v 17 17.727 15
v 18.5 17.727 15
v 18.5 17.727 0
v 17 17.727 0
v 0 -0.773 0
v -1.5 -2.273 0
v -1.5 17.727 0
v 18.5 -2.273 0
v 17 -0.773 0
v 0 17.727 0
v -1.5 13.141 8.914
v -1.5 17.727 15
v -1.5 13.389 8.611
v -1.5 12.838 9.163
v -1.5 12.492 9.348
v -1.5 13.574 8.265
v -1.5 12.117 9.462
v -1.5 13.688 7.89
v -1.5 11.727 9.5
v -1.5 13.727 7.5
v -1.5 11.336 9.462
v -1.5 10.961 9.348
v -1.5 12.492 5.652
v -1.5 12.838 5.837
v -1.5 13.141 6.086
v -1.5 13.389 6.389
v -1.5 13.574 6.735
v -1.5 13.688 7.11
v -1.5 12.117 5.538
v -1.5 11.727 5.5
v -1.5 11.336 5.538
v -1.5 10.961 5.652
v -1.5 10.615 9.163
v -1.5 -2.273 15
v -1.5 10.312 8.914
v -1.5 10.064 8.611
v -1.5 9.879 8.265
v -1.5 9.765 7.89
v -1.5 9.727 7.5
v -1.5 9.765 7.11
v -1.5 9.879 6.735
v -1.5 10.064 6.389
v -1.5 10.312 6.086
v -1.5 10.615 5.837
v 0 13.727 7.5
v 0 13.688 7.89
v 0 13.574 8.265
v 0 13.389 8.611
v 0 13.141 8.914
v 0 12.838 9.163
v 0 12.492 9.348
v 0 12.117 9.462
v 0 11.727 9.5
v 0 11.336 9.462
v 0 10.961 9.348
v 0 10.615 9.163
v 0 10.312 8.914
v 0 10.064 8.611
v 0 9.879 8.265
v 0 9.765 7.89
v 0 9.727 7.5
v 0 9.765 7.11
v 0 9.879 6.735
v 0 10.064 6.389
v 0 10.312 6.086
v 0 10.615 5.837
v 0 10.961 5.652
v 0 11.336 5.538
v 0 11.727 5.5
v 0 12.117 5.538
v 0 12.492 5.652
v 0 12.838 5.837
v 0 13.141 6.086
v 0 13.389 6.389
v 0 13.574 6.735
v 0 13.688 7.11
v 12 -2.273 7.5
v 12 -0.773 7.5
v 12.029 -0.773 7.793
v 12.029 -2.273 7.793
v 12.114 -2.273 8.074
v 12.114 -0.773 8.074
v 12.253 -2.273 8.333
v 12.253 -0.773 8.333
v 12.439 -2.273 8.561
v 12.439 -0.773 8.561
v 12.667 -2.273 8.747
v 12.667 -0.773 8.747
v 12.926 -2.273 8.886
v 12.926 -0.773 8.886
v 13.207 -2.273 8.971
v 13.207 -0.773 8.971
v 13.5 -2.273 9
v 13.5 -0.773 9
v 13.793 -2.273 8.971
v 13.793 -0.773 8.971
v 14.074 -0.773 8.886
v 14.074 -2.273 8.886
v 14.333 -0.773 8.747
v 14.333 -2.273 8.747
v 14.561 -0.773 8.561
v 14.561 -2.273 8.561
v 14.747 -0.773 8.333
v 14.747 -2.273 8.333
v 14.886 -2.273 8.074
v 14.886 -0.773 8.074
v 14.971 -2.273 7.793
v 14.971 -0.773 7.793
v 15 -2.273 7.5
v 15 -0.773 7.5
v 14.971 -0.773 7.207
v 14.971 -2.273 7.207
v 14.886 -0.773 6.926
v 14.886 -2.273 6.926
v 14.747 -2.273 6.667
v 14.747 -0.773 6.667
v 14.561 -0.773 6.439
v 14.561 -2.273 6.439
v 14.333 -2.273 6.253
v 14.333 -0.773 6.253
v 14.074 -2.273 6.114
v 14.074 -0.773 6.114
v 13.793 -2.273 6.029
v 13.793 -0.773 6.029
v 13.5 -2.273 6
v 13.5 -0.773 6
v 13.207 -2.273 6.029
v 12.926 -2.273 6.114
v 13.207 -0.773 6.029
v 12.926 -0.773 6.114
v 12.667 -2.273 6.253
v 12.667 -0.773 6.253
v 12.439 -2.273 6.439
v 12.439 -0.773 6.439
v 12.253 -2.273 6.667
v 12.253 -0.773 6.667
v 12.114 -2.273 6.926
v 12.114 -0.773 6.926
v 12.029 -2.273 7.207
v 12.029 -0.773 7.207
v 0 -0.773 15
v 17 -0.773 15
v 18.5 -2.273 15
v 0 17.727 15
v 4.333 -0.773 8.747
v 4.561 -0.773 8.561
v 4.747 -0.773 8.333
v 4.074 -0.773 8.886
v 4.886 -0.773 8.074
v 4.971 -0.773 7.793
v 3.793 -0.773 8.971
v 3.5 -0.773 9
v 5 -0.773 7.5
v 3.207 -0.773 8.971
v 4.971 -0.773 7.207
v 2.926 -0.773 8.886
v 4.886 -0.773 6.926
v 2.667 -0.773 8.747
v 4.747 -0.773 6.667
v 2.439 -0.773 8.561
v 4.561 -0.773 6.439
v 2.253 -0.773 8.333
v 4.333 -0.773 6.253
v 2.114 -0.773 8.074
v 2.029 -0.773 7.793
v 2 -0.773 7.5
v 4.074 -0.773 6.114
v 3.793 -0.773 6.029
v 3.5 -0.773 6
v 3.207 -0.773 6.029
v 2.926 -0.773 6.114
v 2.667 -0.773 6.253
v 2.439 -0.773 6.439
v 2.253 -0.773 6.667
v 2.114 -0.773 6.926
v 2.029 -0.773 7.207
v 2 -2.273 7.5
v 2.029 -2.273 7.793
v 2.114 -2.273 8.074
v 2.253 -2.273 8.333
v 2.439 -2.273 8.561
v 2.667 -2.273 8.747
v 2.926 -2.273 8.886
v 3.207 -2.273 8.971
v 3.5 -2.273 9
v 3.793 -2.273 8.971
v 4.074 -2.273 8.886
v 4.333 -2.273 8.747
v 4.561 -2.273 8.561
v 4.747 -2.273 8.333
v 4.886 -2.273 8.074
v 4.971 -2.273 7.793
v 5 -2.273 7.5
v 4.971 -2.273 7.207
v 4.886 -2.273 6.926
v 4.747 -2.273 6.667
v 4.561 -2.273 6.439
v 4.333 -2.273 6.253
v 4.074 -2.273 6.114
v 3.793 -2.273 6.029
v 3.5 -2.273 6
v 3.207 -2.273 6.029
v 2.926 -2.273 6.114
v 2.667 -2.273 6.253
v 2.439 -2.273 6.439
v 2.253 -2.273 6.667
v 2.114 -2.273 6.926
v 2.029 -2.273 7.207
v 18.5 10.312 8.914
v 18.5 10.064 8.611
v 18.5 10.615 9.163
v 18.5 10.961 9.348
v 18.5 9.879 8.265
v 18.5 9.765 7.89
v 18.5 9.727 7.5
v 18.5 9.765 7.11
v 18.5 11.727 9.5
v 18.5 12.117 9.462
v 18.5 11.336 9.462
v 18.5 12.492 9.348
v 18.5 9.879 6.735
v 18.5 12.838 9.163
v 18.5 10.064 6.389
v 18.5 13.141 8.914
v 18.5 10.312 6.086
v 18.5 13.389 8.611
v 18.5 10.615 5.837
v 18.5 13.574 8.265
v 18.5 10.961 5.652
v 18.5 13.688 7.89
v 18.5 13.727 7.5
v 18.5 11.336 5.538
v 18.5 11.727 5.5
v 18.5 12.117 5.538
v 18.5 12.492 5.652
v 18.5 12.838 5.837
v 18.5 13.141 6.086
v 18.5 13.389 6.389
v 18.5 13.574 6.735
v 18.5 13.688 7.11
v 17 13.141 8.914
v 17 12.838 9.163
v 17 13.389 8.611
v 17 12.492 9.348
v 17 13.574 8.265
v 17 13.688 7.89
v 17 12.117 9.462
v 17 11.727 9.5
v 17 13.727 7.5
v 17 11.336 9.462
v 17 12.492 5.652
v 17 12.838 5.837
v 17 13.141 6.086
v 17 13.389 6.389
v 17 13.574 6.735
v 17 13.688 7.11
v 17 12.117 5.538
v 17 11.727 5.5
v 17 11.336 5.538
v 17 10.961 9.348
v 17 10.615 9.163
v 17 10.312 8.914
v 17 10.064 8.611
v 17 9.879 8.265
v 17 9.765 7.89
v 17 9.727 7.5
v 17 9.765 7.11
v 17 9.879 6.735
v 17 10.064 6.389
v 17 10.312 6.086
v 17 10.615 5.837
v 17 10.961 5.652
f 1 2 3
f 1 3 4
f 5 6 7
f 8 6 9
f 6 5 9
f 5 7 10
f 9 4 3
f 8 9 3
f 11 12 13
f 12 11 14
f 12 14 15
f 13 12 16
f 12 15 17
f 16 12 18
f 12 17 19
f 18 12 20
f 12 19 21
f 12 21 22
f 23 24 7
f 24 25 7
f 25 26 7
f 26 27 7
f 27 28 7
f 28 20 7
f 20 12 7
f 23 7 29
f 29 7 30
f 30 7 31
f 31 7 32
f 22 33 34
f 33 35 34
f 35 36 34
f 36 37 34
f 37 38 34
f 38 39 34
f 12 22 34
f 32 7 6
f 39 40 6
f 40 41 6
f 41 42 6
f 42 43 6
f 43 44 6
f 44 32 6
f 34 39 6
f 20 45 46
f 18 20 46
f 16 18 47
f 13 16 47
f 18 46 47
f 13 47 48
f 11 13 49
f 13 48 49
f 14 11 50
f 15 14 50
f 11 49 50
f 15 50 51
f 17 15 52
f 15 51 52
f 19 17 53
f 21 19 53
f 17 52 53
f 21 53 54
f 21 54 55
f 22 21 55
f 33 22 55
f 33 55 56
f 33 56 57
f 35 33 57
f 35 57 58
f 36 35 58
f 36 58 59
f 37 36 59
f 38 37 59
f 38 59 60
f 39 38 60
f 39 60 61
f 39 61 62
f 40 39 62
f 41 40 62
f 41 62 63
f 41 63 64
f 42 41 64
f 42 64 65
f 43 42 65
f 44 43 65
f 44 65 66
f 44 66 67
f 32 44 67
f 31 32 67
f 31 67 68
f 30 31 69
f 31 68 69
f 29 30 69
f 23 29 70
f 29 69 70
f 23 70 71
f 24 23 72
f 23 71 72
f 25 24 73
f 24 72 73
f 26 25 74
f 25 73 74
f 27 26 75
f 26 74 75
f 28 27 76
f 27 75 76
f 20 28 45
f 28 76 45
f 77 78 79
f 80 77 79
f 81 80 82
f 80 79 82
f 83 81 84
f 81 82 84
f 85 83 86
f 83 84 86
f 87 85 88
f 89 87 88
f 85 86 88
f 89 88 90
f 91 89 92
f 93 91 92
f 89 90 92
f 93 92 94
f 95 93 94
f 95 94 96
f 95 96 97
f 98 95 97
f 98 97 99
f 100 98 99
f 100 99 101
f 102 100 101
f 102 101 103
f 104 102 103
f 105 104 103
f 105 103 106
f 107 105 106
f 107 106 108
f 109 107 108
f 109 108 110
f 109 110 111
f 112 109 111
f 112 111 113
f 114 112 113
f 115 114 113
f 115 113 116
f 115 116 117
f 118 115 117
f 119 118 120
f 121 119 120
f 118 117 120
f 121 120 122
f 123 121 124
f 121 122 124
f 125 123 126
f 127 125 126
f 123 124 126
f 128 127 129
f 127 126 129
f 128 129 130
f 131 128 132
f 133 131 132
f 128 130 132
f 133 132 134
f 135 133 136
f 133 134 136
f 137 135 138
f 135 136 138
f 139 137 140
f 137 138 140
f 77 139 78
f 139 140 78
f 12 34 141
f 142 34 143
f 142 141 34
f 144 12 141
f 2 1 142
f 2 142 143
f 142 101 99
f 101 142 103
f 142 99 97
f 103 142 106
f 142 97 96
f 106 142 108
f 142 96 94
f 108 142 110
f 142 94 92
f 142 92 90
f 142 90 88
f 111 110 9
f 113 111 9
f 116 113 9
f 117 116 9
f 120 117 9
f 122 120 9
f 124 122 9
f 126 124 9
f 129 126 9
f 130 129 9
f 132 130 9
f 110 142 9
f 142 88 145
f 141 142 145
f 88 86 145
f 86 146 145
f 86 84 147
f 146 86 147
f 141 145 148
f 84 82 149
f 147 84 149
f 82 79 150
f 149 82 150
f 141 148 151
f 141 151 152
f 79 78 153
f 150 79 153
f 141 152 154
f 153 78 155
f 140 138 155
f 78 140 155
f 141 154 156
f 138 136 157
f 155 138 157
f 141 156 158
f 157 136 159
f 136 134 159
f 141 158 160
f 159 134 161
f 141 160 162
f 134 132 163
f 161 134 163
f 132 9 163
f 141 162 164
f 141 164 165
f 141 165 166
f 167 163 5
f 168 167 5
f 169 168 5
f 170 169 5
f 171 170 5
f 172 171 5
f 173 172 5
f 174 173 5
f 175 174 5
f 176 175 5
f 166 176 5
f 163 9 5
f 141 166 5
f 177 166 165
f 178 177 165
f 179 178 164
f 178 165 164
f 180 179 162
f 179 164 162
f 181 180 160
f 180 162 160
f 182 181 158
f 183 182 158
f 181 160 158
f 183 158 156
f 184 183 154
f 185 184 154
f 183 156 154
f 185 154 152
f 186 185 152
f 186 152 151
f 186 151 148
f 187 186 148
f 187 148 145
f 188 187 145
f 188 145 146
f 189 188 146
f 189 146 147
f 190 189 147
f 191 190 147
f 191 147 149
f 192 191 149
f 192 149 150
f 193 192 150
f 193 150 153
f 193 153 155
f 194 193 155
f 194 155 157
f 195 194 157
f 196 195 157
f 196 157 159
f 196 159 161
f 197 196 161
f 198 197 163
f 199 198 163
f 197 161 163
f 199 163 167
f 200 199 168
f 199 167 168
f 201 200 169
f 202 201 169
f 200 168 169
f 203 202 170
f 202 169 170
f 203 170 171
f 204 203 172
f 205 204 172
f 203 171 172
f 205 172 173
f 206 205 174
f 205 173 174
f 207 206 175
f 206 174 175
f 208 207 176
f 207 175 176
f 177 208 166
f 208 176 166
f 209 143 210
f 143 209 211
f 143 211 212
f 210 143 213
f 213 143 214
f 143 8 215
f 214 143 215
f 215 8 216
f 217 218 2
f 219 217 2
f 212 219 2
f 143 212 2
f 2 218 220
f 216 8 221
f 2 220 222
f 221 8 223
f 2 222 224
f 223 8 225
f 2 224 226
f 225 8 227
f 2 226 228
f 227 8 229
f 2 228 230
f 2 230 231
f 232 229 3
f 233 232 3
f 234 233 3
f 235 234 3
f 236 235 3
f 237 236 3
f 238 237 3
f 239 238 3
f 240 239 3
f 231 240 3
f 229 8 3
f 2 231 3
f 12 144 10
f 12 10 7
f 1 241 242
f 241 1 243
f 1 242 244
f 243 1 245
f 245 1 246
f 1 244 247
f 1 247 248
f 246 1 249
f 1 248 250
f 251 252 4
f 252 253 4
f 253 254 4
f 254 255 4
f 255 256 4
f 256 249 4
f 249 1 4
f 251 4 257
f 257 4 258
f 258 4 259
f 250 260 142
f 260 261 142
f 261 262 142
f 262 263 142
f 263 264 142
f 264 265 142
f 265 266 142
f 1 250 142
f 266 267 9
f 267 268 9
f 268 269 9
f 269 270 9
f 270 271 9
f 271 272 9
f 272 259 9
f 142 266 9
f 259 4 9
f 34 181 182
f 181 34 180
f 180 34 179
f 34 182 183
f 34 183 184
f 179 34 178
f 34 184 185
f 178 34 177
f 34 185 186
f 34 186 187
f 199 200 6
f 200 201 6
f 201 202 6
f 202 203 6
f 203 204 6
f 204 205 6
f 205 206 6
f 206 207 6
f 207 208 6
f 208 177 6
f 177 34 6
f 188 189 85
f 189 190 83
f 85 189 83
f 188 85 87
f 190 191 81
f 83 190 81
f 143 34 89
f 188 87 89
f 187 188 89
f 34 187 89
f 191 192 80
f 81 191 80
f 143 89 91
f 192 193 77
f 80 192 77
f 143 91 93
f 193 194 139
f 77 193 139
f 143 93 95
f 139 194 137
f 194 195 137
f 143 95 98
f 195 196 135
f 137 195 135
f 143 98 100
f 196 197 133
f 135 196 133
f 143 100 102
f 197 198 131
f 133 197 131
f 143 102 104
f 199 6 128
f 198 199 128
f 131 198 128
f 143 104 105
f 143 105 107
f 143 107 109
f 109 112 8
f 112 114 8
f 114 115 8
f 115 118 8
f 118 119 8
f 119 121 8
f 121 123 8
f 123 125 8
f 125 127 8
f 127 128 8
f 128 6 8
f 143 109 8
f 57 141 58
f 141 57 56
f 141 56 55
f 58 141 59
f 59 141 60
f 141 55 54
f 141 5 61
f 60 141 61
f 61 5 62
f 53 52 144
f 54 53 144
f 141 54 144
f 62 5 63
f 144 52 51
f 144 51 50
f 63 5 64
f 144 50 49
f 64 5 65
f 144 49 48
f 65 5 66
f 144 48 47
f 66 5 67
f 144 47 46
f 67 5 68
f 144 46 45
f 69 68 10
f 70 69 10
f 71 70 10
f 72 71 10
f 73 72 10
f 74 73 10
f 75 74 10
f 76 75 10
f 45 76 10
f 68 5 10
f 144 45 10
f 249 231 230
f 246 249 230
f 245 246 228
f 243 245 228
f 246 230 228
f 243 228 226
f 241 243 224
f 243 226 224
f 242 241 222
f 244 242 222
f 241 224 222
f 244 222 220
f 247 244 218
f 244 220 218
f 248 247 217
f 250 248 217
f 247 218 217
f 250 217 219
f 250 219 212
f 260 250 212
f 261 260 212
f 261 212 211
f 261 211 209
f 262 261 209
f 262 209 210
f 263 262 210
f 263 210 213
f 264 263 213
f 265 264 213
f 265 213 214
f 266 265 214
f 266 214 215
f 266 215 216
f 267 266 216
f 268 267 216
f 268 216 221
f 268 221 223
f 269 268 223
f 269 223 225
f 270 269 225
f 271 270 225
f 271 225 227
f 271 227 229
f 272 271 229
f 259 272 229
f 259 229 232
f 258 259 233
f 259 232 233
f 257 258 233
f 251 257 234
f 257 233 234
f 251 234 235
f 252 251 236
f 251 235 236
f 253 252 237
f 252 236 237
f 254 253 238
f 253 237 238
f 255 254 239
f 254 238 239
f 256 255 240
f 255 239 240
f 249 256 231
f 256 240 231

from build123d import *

# Parameters (mm, degrees)
EXTRUSION1_DEPTH = 15
ESQUISSE3_R      = 2
EXTRUSION3_DEPTH = 31.646855226
ESQUISSE4_R      = 1.5
EXTRUSION4_DEPTH = 10


with BuildPart() as part:
    # Esquisse1 → Extrusion1 (new body)
    with BuildSketch(Plane.XY):
        Polygon((-1.5, 17.726526316), (-1.5, -2.273473684), (18.5, -2.273473684), (18.5, 17.726526316), (17, 17.726526316), (17, -0.773473684), (0, -0.773473684), (0, 17.726526316), align=None)
    extrude(amount=EXTRUSION1_DEPTH)

    # Esquisse3 → Extrusion3 (cut, through all)
    with BuildSketch(Plane(origin=(18.5, 0, 0), x_dir=(0, 0, -1), z_dir=(1, 0, 0))):
        with Locations(Location((-7.5, 11.726526316, 0), (0, 0, 90))):
            Circle(ESQUISSE3_R)
    extrude(amount=-EXTRUSION3_DEPTH, mode=Mode.SUBTRACT)

    # Esquisse4 → Extrusion4 (cut)
    with BuildSketch(Plane(origin=(0, -0.773473684, 0), x_dir=(1, 0, 0), z_dir=(0, 1, 0))):
        with Locations(Location((3.5, -7.5, 0), (0, 0, 180))):
            Circle(ESQUISSE4_R)
        with Locations(Location((13.5, -7.5, 0), (0, 0, 180))):
            Circle(ESQUISSE4_R)
    extrude(amount=-EXTRUSION4_DEPTH, mode=Mode.SUBTRACT)


solid = part.part
